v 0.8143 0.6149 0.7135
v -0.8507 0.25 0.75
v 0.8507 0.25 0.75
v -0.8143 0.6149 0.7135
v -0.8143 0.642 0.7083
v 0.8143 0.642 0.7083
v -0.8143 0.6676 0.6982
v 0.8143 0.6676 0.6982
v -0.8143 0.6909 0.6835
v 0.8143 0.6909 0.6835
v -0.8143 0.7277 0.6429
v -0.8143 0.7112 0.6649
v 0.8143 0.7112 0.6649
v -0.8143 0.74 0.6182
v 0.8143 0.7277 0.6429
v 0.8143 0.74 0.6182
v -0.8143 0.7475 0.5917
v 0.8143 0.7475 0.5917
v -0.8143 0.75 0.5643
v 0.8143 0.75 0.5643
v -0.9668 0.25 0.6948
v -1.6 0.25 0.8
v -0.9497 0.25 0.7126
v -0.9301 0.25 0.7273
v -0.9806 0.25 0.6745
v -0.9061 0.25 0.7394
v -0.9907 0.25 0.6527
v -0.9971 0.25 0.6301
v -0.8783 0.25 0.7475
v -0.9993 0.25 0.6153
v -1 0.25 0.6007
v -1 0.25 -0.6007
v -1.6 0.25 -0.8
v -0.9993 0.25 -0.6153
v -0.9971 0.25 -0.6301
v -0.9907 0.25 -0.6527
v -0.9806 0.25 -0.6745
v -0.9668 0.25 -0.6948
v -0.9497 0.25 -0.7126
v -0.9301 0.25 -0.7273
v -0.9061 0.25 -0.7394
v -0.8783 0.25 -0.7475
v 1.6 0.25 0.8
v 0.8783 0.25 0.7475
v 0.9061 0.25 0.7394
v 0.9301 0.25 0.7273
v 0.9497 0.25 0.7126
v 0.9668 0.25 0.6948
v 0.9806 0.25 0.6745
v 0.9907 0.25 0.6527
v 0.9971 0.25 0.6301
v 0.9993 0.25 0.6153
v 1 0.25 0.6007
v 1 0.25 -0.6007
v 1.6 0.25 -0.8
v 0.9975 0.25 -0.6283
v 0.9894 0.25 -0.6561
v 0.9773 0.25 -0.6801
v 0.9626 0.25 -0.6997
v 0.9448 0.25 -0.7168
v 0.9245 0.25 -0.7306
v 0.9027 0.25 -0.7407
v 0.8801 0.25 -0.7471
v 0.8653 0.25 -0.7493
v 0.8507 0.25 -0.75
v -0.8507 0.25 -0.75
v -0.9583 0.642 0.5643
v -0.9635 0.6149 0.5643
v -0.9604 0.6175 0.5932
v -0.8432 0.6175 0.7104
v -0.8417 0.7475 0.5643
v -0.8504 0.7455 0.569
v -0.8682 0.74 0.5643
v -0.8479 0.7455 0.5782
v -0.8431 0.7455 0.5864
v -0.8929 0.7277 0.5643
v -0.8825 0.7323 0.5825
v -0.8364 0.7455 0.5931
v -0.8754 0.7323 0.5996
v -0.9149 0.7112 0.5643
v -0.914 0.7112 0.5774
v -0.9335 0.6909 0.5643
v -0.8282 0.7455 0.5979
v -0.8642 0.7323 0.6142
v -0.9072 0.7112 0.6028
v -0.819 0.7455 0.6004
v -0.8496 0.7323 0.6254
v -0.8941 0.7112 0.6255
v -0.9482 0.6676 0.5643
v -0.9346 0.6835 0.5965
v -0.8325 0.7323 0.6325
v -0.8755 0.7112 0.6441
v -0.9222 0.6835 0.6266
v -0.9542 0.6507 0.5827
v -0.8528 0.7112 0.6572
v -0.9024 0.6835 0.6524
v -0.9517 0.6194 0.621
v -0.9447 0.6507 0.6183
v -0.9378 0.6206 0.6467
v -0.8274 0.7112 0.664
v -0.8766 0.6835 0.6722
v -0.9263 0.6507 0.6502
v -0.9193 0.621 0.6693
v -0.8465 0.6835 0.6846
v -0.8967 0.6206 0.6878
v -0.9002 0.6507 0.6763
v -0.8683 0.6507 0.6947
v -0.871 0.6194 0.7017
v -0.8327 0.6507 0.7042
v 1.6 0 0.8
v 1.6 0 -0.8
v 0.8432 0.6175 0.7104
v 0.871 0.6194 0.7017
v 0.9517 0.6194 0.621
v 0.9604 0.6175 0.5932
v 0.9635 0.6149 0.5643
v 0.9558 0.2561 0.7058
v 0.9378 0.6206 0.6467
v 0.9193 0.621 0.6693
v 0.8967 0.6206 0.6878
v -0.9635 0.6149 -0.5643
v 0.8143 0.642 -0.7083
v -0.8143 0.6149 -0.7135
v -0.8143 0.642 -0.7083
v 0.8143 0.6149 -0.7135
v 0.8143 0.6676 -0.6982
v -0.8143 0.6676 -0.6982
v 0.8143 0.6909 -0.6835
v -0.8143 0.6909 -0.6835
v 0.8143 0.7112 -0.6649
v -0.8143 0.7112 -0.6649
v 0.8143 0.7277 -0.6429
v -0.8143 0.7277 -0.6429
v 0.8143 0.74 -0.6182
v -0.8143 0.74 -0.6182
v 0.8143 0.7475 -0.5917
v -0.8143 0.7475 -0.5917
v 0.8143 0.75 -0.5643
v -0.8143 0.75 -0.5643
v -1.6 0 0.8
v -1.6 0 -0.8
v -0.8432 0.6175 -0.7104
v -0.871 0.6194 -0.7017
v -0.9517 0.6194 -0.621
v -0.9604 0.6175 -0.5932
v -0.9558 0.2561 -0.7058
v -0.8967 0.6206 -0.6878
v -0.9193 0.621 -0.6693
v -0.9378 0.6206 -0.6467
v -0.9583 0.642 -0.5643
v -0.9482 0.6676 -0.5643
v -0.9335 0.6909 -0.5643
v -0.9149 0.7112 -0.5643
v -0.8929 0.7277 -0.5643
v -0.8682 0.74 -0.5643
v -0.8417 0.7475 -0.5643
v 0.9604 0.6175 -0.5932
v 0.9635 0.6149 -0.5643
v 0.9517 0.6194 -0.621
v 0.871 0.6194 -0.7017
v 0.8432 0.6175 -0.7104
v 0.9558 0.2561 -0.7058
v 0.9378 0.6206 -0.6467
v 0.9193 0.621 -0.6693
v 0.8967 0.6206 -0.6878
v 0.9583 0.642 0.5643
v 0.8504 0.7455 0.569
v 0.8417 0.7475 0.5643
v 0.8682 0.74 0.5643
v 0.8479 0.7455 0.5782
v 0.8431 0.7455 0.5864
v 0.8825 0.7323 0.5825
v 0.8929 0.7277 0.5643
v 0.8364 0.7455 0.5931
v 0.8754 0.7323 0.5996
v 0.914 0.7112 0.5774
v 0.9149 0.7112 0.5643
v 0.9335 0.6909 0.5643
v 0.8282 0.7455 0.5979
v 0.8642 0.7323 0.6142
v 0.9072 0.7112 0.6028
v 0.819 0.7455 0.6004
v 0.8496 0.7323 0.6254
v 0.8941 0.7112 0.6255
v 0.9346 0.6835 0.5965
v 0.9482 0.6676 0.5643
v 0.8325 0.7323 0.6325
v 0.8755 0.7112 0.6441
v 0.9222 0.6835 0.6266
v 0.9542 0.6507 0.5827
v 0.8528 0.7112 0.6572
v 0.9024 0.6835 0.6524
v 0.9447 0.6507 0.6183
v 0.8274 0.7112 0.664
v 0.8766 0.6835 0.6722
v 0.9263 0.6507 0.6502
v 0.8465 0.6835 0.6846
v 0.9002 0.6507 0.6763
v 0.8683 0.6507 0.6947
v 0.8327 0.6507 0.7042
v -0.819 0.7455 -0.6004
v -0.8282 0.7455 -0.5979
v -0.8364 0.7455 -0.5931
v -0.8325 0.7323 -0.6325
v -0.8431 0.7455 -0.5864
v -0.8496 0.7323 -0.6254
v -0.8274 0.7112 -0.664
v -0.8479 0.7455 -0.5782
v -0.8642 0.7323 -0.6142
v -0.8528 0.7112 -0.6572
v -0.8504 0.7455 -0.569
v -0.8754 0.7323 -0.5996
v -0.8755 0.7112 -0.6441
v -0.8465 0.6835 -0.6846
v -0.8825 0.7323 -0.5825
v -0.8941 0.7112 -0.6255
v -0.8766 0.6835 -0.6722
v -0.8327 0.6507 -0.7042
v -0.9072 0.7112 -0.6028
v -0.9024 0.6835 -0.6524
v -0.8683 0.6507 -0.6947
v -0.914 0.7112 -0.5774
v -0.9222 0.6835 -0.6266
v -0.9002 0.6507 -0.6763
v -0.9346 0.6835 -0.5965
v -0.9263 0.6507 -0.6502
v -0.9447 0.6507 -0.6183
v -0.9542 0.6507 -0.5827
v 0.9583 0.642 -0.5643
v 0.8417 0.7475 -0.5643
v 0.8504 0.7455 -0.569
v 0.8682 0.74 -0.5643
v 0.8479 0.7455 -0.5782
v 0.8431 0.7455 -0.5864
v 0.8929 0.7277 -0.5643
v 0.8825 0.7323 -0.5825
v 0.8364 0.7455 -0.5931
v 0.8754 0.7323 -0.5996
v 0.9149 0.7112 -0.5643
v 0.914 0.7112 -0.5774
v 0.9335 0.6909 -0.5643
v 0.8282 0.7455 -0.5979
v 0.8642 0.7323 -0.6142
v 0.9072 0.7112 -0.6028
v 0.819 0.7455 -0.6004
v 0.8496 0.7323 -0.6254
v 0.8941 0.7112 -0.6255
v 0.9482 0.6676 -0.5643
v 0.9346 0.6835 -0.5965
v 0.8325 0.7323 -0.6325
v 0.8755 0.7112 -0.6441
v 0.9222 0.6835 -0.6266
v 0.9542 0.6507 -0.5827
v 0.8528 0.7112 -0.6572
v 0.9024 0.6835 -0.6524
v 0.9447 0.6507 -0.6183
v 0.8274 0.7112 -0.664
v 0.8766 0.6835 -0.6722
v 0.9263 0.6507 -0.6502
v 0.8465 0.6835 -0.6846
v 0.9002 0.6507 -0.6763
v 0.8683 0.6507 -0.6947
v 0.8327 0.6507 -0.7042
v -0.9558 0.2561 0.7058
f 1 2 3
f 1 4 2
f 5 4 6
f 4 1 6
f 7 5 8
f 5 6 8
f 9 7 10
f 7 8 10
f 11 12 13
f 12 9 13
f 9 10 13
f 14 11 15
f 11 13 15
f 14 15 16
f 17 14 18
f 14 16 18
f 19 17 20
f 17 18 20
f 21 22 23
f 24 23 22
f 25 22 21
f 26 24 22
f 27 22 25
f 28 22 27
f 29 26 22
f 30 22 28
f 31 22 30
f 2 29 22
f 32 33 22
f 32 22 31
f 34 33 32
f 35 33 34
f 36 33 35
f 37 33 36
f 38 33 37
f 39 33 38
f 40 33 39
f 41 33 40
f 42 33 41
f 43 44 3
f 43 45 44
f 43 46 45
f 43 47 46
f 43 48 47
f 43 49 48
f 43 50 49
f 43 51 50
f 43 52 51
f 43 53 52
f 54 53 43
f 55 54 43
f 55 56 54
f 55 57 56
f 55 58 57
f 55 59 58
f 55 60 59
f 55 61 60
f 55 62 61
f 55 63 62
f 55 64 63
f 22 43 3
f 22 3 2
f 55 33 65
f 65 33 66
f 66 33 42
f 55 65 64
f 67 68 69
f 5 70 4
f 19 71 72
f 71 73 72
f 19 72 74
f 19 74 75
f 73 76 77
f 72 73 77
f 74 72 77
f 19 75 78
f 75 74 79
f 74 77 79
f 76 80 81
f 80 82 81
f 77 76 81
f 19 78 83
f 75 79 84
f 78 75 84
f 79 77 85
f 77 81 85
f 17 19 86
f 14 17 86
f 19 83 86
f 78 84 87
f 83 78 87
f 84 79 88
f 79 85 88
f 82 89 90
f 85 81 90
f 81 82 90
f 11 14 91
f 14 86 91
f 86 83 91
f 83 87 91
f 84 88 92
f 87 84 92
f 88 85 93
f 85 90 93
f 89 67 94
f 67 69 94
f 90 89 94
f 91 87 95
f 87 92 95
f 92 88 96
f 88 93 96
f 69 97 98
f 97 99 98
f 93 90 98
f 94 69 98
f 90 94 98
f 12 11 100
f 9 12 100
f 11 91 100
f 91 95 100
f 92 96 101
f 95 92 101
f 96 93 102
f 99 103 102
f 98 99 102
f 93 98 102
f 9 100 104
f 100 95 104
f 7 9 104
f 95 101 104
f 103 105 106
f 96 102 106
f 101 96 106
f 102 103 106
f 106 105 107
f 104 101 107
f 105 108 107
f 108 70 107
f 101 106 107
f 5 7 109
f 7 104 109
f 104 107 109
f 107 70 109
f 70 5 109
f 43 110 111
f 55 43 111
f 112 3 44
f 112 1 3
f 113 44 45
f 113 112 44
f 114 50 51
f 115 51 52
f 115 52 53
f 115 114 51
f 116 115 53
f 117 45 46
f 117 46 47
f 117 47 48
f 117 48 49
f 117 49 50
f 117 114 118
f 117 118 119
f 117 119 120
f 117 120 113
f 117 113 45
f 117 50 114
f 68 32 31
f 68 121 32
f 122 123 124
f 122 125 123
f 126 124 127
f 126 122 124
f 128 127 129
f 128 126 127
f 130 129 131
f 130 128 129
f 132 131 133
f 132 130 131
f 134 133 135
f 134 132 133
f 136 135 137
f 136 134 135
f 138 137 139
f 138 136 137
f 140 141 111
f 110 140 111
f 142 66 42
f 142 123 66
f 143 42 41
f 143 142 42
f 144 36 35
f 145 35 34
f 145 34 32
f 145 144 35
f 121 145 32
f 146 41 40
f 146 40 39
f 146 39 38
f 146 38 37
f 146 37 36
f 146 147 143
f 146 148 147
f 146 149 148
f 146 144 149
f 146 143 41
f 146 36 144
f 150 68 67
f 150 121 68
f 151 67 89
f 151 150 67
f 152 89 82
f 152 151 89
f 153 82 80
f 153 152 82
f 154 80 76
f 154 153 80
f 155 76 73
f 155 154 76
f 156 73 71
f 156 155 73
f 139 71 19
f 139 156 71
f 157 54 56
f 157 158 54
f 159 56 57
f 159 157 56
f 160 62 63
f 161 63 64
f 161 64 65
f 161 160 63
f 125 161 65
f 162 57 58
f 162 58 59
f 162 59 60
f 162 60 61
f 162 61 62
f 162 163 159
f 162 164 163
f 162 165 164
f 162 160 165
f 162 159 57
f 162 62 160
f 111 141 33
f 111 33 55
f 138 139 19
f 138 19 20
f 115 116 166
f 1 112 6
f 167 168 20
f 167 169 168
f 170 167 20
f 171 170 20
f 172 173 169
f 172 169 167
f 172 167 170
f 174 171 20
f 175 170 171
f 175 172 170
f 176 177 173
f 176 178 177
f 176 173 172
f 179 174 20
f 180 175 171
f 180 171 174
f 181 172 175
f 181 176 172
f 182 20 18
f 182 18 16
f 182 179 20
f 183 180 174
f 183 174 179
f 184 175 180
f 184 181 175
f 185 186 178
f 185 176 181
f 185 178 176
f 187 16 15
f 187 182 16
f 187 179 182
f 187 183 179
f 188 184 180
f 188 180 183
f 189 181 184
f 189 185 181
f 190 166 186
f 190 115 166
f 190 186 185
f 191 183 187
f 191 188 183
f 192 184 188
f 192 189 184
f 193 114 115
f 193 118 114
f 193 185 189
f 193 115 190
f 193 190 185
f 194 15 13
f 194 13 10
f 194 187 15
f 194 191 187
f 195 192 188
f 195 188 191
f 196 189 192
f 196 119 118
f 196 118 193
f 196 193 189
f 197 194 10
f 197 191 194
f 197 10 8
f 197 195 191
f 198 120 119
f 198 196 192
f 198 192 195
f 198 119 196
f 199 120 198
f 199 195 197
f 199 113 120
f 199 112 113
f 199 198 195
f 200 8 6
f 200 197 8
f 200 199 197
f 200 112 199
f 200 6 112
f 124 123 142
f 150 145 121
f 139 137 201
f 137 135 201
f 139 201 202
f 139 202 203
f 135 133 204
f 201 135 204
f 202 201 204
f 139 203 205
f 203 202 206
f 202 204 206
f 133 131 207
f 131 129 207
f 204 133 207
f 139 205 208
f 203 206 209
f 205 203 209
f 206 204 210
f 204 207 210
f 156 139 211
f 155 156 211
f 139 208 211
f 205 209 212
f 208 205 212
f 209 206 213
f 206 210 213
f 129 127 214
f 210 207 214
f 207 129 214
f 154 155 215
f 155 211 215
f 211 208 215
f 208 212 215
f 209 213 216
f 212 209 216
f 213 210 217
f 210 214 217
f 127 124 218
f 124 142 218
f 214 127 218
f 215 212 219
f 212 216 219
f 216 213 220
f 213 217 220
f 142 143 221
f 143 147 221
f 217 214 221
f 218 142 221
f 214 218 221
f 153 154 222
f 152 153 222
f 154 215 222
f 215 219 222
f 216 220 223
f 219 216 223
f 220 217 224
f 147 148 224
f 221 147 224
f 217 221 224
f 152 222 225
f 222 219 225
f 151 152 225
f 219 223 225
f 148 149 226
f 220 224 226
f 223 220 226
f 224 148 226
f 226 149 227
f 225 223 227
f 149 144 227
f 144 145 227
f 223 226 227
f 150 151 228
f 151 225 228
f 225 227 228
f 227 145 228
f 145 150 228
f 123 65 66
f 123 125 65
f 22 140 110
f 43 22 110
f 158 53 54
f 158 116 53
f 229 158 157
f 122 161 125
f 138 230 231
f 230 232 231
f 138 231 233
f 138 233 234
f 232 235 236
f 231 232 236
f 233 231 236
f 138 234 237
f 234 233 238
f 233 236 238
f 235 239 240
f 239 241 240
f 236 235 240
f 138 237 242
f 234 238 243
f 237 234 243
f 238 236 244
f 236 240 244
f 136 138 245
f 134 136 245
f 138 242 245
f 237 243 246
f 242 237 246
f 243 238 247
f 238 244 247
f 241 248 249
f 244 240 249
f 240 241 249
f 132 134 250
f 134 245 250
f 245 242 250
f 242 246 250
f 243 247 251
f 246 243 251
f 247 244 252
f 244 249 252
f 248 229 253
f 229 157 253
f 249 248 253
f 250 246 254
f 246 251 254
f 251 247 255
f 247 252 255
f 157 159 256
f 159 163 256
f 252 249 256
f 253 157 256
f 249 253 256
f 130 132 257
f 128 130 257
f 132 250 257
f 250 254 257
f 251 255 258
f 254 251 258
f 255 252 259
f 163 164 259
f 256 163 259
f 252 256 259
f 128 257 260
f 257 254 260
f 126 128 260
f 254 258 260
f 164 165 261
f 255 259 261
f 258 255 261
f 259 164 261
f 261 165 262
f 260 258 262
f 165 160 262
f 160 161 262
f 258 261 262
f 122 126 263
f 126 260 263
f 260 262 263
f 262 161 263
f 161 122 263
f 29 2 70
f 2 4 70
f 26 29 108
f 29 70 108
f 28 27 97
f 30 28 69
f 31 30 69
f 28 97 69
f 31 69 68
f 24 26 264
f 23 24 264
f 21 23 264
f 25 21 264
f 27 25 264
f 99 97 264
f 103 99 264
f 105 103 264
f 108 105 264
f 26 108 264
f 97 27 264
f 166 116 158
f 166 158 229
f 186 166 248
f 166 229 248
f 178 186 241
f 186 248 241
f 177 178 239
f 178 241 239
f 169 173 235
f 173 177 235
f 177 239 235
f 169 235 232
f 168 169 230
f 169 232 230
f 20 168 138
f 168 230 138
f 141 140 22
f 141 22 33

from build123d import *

# Parameters (mm, degrees)
SKETCH2_W           = 3.2
SKETCH2_H           = 1.6
BOSS_EXTRUDE1_DEPTH = 0.25
SKETCH4_W           = 2
SKETCH4_H           = 1.5
BOSS_EXTRUDE2_DEPTH = 0.5
BOSS_EXTRUDE2_TAPER = 5.71
FILLET1_R           = 0.15


with BuildPart() as part:
    # Sketch2 → Boss-Extrude1 (new body)
    with BuildSketch(Plane(origin=(0, 0, 0), x_dir=(1, 0, 0), z_dir=(0, 1, 0))):
        Rectangle(SKETCH2_W, SKETCH2_H)
    extrude(amount=BOSS_EXTRUDE1_DEPTH)

    # Sketch4 → Boss-Extrude2 (add)
    with BuildSketch(Plane(origin=(0, 0.25, 0), x_dir=(1, 0, 0), z_dir=(0, 1, 0))):
        Rectangle(SKETCH4_W, SKETCH4_H)
    extrude(amount=BOSS_EXTRUDE2_DEPTH, taper=BOSS_EXTRUDE2_TAPER)

    # Fillet1
    fillet1_edges = [part.edges().sort_by_distance(p)[0] for p in [
        (0.975002614, 0.5, 0.725002614),
        (0.975002614, 0.5, -0.725002614),
        (-0.975002614, 0.5, -0.725002614),
        (-0.975002614, 0.5, 0.725002614),
        (0.950005228, 0.75, 0),
        (0, 0.75, -0.700005228),
        (-0.950005228, 0.75, 0),
        (0, 0.75, 0.700005228),
    ]]
    fillet(fillet1_edges, radius=FILLET1_R)


solid = part.part
